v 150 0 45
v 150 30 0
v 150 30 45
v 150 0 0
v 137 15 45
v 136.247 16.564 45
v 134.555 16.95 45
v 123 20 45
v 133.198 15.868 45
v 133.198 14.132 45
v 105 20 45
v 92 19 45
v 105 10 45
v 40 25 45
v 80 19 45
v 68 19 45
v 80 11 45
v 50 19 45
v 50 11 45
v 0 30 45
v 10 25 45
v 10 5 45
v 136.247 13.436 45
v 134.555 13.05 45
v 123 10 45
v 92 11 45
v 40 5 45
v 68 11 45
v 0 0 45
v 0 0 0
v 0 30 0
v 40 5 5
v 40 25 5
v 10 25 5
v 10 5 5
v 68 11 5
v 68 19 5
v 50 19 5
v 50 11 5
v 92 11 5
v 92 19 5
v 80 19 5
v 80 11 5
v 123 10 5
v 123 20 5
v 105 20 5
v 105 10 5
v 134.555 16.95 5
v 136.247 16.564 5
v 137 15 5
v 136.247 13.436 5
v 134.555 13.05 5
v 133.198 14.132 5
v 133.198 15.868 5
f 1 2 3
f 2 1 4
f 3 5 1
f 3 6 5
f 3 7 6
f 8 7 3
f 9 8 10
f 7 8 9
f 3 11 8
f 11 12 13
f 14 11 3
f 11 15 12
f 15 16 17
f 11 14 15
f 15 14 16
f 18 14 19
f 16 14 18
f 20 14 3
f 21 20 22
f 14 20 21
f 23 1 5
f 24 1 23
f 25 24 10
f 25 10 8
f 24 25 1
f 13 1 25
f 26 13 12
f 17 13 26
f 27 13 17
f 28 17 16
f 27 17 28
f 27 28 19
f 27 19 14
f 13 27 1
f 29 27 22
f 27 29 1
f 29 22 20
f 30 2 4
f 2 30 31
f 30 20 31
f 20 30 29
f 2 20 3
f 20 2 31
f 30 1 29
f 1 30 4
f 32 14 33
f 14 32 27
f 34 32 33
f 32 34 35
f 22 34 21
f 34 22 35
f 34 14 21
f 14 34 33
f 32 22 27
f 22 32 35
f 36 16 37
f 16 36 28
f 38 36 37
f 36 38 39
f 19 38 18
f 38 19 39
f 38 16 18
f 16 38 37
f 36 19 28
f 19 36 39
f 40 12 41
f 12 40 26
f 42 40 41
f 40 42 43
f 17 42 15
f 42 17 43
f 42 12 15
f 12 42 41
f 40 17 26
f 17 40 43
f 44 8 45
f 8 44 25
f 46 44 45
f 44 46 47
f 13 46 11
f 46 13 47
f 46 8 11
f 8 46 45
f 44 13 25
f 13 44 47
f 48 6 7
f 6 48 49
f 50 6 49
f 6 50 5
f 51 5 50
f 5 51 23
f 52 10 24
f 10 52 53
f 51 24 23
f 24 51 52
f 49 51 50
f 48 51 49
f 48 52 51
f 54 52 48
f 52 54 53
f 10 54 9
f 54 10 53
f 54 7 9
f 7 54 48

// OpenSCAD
difference()
{
  cube([150,30,45]);
  translate([10,5,5]) cube([30,20,50]);
  translate([50,11,5]) cube([18,8,50]);
  translate([80,11,5]) cube([12,8,50]);
  translate([105,10,5]) cube([18,10,50]);
  translate([135,15,5]) cylinder(h=50,d=4);
}
